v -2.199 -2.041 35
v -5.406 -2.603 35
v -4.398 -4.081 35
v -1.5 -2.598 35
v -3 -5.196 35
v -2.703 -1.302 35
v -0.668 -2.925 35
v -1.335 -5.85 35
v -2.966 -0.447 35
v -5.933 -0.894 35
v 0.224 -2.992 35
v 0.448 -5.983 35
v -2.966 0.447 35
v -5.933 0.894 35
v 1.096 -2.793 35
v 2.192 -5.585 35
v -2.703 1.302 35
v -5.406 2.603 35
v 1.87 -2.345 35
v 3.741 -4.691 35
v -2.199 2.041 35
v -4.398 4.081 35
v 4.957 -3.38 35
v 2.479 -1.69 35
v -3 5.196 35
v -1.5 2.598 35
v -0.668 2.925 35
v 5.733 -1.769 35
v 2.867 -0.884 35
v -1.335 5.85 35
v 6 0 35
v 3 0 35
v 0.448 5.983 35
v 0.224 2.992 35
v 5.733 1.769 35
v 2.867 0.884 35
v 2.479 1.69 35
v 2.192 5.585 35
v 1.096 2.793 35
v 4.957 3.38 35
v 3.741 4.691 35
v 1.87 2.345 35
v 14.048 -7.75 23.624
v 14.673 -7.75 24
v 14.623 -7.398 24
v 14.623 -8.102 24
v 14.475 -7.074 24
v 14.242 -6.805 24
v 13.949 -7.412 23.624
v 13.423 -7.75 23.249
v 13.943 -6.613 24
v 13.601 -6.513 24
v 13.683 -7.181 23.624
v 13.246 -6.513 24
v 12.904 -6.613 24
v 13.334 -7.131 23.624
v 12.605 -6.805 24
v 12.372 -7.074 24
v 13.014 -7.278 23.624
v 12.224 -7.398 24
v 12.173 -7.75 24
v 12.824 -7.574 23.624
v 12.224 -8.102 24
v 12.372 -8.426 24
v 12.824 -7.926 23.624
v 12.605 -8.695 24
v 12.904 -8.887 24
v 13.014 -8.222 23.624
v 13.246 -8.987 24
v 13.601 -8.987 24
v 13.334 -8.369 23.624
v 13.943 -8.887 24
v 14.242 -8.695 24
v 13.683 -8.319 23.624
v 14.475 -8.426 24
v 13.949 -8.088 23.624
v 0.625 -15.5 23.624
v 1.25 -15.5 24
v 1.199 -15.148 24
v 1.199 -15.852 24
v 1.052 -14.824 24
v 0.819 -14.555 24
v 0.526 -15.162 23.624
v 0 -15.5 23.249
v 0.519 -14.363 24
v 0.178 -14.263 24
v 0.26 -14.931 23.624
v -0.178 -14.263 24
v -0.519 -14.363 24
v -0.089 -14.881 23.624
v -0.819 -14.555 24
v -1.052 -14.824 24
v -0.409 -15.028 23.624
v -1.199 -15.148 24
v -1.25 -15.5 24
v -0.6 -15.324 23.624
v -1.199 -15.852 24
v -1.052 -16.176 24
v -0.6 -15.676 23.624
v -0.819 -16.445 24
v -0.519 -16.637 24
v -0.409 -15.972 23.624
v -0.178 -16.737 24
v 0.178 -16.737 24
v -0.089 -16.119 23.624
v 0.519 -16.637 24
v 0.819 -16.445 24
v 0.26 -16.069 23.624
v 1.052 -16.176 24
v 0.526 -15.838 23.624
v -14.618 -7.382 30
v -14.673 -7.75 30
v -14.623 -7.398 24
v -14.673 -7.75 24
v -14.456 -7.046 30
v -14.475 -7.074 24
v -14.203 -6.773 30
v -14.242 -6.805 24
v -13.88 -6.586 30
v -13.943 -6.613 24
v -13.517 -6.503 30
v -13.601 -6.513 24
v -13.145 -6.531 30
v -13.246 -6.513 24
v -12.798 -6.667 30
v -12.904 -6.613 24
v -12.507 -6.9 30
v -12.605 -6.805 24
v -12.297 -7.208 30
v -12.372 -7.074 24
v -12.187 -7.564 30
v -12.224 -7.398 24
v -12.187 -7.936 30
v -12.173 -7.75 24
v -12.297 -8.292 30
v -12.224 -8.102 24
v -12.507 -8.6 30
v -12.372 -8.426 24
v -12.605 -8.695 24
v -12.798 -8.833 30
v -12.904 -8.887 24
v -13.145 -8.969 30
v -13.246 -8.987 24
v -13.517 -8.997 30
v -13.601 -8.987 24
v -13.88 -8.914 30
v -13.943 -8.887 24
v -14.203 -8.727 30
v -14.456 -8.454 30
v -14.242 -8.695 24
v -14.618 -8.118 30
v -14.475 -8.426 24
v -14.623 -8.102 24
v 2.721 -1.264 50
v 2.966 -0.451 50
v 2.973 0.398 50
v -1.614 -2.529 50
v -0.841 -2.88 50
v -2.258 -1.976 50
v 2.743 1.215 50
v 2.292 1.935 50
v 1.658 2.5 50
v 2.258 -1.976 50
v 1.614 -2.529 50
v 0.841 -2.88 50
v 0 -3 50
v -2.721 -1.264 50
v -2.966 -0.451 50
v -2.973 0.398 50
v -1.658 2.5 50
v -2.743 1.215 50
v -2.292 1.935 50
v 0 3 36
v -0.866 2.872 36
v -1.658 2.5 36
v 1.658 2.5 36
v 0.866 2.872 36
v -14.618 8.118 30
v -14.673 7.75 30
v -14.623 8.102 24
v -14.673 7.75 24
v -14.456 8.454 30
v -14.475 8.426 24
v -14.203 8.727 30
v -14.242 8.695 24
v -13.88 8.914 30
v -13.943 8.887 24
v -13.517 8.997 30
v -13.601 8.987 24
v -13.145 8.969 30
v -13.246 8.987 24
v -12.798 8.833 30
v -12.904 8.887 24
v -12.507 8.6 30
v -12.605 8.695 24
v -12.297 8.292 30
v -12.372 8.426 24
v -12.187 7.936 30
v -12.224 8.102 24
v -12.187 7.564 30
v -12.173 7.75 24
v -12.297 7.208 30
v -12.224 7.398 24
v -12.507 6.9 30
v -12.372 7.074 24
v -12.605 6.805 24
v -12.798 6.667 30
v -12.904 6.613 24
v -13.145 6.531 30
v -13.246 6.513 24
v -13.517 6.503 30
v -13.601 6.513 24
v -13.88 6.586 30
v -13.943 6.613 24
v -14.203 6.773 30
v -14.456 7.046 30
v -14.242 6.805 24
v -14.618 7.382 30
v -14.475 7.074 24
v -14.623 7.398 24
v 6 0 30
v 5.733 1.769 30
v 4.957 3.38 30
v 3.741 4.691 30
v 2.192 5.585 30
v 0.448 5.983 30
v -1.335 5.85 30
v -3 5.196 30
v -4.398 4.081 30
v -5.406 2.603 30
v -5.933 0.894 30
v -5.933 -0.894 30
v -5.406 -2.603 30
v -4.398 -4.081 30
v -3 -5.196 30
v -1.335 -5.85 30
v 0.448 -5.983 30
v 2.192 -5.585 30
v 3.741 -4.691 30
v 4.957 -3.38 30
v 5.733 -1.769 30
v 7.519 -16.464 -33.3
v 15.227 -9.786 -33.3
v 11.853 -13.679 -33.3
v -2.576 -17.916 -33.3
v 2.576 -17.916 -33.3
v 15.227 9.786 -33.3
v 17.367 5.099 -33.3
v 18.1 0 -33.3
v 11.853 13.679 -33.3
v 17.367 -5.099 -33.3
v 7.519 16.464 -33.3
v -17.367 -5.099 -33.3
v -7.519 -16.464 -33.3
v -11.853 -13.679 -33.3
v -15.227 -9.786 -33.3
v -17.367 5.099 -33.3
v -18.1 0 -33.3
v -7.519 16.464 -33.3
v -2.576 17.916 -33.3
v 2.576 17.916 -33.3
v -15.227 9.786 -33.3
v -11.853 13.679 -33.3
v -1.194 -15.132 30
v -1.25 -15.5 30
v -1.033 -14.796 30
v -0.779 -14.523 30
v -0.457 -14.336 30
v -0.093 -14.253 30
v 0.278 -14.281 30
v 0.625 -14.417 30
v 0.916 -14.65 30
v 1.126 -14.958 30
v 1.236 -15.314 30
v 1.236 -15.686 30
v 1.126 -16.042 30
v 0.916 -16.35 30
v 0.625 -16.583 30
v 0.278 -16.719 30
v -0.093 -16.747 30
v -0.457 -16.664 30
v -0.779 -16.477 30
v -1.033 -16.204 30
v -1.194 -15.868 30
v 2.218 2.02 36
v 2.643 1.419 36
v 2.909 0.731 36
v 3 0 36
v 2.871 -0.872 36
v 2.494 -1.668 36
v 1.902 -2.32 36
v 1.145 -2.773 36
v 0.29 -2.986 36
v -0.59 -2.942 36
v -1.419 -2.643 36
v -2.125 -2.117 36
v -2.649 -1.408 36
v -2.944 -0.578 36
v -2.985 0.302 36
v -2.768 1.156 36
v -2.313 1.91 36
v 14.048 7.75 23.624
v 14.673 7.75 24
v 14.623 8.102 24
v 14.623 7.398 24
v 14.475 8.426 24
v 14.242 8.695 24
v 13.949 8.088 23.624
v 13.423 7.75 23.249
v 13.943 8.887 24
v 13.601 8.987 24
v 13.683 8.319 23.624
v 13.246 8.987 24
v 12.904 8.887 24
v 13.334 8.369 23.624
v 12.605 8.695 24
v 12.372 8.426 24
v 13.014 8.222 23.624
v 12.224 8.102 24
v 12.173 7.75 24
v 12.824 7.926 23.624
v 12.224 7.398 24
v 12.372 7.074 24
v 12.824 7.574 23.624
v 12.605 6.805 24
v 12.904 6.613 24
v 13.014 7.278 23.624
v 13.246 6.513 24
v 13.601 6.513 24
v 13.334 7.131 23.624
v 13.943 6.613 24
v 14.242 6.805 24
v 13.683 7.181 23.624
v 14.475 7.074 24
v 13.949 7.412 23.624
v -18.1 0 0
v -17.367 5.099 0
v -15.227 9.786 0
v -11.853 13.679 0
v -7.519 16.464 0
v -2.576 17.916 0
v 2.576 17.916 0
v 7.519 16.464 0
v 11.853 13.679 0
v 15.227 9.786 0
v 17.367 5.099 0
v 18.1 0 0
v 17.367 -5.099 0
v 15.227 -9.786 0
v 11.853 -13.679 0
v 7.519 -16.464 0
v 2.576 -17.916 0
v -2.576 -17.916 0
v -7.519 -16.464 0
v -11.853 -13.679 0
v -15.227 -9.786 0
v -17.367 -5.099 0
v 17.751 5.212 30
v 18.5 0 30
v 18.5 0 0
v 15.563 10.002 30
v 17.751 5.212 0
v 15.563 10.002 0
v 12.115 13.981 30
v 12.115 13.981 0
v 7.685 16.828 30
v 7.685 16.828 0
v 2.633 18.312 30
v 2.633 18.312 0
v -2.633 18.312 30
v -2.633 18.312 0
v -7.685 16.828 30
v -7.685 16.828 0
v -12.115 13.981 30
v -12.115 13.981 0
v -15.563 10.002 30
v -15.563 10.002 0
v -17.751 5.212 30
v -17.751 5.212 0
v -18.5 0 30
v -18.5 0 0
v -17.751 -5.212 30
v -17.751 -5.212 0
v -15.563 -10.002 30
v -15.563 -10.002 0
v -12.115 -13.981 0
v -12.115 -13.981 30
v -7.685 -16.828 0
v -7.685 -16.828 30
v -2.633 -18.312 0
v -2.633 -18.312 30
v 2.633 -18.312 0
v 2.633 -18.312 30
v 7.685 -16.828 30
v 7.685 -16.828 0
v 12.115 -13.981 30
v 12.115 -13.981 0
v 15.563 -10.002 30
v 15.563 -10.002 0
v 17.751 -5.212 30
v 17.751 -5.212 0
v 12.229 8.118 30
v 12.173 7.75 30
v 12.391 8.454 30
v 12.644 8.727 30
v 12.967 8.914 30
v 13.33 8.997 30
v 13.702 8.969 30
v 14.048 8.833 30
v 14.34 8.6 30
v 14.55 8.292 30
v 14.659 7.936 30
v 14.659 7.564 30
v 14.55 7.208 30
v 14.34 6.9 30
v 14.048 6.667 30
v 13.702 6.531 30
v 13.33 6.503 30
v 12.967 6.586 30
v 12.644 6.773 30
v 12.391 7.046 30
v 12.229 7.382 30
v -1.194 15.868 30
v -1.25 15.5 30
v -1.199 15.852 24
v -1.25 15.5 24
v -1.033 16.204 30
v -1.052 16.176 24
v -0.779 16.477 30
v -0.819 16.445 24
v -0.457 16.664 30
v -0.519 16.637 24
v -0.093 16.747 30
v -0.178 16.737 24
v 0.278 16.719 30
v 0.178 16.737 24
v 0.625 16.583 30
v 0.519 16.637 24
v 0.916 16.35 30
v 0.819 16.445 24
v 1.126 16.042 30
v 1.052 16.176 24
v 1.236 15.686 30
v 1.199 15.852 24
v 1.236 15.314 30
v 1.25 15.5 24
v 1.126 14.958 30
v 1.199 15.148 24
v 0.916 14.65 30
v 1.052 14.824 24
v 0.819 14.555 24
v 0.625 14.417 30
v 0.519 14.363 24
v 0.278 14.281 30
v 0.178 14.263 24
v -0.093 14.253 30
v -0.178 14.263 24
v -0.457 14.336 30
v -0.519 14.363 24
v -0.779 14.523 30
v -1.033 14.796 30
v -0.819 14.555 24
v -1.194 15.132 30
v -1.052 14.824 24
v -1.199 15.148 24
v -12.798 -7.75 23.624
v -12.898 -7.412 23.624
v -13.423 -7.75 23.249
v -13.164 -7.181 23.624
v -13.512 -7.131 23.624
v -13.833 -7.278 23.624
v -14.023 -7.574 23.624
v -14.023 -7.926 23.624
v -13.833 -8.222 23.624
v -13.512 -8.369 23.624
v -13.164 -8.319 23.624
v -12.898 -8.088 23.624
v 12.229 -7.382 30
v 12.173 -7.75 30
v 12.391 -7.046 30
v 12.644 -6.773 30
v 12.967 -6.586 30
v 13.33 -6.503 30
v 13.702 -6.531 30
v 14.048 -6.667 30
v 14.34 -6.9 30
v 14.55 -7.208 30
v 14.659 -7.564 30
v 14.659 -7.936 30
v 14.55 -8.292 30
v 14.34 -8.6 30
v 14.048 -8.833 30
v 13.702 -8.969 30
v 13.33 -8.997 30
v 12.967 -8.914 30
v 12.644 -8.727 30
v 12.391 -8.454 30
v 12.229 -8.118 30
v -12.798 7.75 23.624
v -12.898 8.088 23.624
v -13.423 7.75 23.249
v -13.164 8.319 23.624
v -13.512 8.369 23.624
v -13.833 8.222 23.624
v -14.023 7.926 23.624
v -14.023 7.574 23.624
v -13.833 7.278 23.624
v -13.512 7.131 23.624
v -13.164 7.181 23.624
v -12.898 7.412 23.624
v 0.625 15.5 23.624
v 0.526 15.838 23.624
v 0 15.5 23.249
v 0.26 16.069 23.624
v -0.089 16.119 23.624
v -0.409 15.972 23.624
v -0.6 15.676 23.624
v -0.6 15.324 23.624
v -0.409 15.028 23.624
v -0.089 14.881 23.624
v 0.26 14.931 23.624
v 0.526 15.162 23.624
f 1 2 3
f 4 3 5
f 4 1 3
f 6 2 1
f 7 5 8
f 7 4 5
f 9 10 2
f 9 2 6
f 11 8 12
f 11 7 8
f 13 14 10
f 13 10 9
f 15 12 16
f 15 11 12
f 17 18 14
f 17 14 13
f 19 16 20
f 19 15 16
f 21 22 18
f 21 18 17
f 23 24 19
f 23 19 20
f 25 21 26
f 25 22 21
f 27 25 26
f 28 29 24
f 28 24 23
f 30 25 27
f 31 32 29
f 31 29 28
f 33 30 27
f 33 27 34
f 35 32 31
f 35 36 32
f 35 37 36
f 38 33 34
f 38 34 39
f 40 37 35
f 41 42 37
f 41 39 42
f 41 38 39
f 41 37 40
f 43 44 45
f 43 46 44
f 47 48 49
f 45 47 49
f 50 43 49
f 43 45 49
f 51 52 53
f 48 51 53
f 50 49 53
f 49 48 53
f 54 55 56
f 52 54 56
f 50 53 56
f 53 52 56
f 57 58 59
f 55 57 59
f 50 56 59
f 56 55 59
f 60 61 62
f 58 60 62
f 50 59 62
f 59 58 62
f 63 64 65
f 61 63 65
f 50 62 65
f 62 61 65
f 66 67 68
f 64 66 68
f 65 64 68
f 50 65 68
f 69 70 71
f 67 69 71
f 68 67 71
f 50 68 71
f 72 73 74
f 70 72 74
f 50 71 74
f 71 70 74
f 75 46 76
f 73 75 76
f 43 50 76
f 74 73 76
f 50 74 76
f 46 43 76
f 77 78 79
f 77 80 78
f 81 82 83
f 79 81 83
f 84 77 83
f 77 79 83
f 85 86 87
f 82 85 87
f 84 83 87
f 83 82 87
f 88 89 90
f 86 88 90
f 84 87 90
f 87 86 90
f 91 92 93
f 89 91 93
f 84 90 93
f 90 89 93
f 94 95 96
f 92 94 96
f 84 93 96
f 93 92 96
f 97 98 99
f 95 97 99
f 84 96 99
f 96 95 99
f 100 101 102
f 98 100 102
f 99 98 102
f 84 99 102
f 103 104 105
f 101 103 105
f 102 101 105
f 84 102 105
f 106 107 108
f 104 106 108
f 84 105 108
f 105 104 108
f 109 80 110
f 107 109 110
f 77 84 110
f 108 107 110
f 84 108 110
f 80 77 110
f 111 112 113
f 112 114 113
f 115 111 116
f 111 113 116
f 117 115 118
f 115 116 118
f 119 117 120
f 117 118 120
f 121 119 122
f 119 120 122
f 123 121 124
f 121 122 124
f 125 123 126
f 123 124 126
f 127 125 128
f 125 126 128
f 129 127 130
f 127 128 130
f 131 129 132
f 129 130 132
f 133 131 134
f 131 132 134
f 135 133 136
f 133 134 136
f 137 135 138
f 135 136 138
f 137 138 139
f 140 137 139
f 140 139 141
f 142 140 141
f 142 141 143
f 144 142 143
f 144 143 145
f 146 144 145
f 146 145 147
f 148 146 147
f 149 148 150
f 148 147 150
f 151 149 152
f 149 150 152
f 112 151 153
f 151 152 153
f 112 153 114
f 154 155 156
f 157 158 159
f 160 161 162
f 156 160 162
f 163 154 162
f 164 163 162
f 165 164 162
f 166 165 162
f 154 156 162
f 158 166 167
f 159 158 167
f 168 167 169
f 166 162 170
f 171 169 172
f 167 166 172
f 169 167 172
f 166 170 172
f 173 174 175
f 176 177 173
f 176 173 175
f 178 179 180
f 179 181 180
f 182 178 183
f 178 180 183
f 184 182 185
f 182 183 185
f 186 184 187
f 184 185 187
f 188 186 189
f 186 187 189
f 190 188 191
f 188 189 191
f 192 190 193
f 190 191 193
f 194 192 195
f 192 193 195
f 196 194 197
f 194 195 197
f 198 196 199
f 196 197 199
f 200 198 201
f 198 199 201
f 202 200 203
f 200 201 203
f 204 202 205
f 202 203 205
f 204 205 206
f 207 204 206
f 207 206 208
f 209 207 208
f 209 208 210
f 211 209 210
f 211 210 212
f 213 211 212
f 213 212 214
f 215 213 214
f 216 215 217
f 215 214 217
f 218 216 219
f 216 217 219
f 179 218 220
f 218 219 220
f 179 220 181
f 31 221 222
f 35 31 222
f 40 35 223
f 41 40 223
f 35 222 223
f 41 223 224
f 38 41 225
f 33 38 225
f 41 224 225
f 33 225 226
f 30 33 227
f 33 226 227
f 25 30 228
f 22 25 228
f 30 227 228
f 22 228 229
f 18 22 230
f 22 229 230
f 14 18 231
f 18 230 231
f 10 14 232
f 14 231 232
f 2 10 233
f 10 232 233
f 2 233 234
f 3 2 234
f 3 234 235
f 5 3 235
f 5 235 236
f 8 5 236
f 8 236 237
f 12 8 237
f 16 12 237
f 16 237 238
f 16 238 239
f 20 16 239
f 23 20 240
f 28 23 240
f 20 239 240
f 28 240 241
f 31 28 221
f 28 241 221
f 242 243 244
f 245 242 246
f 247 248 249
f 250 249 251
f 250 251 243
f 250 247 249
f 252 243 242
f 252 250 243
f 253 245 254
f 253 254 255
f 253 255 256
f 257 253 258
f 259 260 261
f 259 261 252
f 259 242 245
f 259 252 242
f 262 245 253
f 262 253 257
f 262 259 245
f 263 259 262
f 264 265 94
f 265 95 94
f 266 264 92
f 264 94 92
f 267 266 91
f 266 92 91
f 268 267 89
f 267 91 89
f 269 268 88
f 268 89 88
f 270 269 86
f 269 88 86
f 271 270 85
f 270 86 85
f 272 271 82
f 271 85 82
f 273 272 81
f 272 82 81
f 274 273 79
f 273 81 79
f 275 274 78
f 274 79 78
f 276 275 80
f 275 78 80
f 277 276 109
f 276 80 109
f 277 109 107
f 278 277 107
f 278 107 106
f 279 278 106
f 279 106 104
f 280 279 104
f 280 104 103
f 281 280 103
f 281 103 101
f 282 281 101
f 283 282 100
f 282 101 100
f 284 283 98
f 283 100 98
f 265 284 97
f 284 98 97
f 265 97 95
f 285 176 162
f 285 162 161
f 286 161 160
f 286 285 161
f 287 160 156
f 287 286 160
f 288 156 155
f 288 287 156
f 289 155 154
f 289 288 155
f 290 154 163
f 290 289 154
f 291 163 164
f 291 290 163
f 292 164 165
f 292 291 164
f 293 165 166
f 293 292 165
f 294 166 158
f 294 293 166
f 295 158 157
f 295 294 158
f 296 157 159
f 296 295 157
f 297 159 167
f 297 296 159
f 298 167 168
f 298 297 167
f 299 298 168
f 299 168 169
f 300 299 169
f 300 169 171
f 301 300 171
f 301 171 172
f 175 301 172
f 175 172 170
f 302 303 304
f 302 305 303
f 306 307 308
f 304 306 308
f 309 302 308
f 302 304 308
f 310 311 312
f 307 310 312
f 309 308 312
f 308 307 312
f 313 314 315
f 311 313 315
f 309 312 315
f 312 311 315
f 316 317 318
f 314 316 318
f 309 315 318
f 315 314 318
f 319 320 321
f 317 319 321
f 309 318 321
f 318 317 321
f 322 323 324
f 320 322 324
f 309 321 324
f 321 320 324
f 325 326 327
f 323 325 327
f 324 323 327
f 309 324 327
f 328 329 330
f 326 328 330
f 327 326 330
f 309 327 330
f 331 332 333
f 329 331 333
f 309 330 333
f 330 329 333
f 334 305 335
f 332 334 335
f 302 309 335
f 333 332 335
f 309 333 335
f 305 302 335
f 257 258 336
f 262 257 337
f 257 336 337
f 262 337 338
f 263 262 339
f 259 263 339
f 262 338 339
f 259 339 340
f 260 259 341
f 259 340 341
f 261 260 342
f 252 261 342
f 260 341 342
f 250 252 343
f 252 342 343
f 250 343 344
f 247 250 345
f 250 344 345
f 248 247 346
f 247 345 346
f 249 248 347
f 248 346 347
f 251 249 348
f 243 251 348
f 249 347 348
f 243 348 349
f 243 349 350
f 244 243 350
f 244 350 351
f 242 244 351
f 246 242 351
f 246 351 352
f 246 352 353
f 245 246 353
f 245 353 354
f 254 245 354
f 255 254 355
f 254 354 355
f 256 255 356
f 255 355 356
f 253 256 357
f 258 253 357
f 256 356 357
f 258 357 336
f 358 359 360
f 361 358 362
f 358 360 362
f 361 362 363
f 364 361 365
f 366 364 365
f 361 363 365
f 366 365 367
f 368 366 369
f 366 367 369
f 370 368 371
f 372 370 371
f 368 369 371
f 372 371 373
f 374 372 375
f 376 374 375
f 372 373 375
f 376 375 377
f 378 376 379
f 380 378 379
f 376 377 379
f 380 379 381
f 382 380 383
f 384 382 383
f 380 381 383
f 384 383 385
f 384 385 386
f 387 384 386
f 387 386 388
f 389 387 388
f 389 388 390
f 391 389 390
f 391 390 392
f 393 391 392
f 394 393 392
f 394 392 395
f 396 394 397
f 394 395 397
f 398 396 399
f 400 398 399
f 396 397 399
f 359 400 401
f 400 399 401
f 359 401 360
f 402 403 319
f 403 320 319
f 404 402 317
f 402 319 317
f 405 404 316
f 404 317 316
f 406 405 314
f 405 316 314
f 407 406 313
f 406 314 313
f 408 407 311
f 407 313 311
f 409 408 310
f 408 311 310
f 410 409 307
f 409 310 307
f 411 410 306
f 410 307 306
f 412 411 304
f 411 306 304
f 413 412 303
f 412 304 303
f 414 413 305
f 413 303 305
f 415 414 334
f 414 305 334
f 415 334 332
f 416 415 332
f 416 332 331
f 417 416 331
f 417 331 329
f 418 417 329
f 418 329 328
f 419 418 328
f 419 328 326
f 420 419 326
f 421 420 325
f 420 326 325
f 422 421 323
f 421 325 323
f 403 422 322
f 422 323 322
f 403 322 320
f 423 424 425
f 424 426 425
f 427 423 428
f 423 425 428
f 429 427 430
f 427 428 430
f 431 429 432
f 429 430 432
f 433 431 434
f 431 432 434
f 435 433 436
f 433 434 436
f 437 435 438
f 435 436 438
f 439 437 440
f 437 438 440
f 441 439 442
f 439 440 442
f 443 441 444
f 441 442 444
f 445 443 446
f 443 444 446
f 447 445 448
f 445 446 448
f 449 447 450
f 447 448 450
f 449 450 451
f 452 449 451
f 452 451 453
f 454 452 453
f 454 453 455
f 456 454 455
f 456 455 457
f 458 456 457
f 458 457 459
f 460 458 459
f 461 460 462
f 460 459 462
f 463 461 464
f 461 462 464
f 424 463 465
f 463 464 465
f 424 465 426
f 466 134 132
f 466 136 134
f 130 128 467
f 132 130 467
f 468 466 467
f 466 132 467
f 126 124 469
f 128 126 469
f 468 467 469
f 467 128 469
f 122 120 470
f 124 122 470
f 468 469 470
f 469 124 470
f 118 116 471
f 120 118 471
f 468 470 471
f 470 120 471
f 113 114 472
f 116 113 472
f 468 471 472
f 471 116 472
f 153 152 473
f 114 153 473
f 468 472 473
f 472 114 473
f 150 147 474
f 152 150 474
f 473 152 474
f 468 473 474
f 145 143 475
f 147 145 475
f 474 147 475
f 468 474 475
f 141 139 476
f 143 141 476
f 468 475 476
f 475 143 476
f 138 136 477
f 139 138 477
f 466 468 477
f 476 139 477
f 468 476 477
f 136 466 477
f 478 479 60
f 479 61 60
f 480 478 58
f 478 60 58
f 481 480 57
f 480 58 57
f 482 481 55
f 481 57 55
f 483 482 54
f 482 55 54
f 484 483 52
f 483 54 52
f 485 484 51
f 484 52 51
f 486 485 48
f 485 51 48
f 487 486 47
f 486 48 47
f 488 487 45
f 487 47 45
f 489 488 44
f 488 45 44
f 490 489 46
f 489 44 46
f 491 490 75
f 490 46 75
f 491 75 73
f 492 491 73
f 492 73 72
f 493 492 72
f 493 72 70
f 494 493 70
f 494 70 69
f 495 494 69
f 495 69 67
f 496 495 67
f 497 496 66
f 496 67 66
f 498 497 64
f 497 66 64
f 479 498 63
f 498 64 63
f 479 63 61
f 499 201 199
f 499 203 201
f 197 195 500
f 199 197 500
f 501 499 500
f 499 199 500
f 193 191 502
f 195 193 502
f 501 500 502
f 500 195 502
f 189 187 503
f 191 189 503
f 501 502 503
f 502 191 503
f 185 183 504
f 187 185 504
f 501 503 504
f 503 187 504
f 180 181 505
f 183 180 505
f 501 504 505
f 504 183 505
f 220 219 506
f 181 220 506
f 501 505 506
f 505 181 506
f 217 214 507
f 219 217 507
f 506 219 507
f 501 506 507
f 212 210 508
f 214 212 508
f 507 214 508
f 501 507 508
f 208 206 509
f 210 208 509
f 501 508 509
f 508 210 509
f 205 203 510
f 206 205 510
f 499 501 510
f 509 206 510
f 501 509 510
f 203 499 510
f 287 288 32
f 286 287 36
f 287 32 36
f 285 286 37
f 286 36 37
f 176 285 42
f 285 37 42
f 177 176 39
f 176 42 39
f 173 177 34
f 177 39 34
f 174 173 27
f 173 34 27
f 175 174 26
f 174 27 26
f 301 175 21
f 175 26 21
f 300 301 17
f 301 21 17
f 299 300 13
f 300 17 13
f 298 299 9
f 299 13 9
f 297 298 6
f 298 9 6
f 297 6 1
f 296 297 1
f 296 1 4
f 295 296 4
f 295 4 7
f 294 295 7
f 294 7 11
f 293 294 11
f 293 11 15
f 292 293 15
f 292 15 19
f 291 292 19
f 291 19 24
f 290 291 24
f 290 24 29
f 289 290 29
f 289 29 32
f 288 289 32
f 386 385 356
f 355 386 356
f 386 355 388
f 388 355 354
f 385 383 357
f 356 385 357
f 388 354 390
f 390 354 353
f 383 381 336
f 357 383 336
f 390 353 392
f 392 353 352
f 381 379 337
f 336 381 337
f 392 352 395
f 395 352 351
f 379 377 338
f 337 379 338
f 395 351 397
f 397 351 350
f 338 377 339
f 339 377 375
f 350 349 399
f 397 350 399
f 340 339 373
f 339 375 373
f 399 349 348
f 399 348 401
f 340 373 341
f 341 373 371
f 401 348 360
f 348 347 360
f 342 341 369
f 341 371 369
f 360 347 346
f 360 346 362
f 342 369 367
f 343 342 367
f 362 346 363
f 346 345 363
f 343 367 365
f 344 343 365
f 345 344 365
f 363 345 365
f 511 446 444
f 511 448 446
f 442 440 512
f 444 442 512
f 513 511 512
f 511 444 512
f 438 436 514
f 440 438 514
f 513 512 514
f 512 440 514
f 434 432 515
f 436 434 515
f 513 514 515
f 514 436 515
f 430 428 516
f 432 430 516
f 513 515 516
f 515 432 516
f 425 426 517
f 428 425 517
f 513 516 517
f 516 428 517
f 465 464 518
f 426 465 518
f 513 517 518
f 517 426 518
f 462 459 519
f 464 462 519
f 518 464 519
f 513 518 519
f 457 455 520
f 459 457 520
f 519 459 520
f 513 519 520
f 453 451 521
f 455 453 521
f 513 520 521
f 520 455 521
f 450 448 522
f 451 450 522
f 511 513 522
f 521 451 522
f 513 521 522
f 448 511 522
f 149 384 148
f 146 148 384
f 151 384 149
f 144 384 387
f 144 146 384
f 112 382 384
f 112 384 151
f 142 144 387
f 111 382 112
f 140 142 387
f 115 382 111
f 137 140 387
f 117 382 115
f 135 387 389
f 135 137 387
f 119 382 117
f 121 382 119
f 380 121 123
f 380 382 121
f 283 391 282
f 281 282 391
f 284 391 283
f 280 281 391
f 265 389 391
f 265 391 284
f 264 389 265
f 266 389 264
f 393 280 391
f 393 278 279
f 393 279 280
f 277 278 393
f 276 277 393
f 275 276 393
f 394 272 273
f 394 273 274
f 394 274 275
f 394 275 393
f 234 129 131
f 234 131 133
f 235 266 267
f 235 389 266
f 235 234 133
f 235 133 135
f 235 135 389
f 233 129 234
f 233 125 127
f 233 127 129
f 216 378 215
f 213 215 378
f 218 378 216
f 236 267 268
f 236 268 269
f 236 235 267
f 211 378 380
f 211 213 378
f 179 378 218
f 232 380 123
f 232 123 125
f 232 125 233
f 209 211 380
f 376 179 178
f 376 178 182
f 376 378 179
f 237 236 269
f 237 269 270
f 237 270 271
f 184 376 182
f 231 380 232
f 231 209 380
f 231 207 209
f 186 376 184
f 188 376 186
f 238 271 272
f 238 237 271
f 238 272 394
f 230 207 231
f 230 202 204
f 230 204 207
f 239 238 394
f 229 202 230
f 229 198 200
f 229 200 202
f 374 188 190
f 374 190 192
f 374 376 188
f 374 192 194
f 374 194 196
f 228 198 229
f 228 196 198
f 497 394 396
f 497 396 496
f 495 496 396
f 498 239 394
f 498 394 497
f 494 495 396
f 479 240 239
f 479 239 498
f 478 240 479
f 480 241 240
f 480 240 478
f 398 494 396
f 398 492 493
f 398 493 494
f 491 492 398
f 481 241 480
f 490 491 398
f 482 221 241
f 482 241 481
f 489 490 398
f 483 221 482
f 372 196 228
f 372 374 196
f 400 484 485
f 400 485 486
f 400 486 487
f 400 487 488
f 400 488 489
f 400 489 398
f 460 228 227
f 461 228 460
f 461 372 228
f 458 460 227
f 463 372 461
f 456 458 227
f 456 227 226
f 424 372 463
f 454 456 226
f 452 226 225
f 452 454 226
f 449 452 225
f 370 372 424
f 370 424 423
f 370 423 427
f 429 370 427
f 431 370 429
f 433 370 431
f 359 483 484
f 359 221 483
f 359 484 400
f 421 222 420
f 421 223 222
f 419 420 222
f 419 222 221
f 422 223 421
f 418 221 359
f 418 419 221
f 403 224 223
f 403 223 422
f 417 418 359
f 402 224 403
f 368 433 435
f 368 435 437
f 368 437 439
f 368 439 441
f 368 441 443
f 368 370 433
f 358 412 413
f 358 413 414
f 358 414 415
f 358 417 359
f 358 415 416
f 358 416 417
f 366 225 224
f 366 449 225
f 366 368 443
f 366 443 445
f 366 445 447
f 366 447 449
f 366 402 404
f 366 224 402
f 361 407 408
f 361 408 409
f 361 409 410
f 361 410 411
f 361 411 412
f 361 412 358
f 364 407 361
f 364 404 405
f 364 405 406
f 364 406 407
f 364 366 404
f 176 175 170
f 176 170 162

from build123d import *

# Parameters (mm, degrees)
SKETCH1_R                 = 18.5
BOSS_EXTRUDE1_DEPTH       = 30
SKETCH2_R                 = 18.1
BOSS_EXTRUDE2_DEPTH       = 33.3
SKETCH3_R                 = 6
BOSS_EXTRUDE3_DEPTH       = 5
SKETCH4_R                 = 3
BOSS_EXTRUDE4_DEPTH       = 1
BOSS_EXTRUDE5_DEPTH       = 14
M3X0_5_TAPPED_HOLE1_D     = 2.5
M3X0_5_TAPPED_HOLE1_DEPTH = 6
M3X0_5_TAPPED_HOLE1_TIP   = 0.751075774


with BuildPart() as part:
    # Sketch1 → Boss-Extrude1 (new body)
    with BuildSketch(Plane.XY):
        Circle(SKETCH1_R)
    extrude(amount=BOSS_EXTRUDE1_DEPTH)

    # Sketch2 → Boss-Extrude2 (add)
    with BuildSketch(Plane(origin=(0, 0, 0), x_dir=(-1, 0, 0), z_dir=(0, 0, -1))):
        Circle(SKETCH2_R)
    extrude(amount=BOSS_EXTRUDE2_DEPTH)

    # Sketch3 → Boss-Extrude3 (add)
    with BuildSketch(Plane.XY.offset(30)):
        Circle(SKETCH3_R)
    extrude(amount=BOSS_EXTRUDE3_DEPTH)

    # Sketch4 → Boss-Extrude4 (add)
    with BuildSketch(Plane.XY.offset(35)):
        Circle(SKETCH4_R)
    extrude(amount=BOSS_EXTRUDE4_DEPTH)

    # Sketch5 → Boss-Extrude5 (add)
    with BuildSketch(Plane.XY.offset(36)):
        with BuildLine():
            Line((-1.658312395, 2.5), (1.658312395, 2.5))
            ThreePointArc((1.658312395, 2.5), (0, -3), (-1.658312395, 2.5))
        make_face()
    extrude(amount=BOSS_EXTRUDE5_DEPTH)

    # M3x0.5 Tapped Hole1
    with Locations(Plane.XY.offset(30)):
        with Locations((0, 15.5), (13.423393759, 7.75), (13.423393759, -7.75), (0, -15.5), (-13.423393759, -7.75), (-13.423393759, 7.75)):
            Hole(M3X0_5_TAPPED_HOLE1_D / 2, depth=M3X0_5_TAPPED_HOLE1_DEPTH)
            with Locations((0, 0, -(M3X0_5_TAPPED_HOLE1_DEPTH + M3X0_5_TAPPED_HOLE1_TIP / 2))):  # 118° drill point
                Cone(0, M3X0_5_TAPPED_HOLE1_D / 2, M3X0_5_TAPPED_HOLE1_TIP, mode=Mode.SUBTRACT)


solid = part.part
